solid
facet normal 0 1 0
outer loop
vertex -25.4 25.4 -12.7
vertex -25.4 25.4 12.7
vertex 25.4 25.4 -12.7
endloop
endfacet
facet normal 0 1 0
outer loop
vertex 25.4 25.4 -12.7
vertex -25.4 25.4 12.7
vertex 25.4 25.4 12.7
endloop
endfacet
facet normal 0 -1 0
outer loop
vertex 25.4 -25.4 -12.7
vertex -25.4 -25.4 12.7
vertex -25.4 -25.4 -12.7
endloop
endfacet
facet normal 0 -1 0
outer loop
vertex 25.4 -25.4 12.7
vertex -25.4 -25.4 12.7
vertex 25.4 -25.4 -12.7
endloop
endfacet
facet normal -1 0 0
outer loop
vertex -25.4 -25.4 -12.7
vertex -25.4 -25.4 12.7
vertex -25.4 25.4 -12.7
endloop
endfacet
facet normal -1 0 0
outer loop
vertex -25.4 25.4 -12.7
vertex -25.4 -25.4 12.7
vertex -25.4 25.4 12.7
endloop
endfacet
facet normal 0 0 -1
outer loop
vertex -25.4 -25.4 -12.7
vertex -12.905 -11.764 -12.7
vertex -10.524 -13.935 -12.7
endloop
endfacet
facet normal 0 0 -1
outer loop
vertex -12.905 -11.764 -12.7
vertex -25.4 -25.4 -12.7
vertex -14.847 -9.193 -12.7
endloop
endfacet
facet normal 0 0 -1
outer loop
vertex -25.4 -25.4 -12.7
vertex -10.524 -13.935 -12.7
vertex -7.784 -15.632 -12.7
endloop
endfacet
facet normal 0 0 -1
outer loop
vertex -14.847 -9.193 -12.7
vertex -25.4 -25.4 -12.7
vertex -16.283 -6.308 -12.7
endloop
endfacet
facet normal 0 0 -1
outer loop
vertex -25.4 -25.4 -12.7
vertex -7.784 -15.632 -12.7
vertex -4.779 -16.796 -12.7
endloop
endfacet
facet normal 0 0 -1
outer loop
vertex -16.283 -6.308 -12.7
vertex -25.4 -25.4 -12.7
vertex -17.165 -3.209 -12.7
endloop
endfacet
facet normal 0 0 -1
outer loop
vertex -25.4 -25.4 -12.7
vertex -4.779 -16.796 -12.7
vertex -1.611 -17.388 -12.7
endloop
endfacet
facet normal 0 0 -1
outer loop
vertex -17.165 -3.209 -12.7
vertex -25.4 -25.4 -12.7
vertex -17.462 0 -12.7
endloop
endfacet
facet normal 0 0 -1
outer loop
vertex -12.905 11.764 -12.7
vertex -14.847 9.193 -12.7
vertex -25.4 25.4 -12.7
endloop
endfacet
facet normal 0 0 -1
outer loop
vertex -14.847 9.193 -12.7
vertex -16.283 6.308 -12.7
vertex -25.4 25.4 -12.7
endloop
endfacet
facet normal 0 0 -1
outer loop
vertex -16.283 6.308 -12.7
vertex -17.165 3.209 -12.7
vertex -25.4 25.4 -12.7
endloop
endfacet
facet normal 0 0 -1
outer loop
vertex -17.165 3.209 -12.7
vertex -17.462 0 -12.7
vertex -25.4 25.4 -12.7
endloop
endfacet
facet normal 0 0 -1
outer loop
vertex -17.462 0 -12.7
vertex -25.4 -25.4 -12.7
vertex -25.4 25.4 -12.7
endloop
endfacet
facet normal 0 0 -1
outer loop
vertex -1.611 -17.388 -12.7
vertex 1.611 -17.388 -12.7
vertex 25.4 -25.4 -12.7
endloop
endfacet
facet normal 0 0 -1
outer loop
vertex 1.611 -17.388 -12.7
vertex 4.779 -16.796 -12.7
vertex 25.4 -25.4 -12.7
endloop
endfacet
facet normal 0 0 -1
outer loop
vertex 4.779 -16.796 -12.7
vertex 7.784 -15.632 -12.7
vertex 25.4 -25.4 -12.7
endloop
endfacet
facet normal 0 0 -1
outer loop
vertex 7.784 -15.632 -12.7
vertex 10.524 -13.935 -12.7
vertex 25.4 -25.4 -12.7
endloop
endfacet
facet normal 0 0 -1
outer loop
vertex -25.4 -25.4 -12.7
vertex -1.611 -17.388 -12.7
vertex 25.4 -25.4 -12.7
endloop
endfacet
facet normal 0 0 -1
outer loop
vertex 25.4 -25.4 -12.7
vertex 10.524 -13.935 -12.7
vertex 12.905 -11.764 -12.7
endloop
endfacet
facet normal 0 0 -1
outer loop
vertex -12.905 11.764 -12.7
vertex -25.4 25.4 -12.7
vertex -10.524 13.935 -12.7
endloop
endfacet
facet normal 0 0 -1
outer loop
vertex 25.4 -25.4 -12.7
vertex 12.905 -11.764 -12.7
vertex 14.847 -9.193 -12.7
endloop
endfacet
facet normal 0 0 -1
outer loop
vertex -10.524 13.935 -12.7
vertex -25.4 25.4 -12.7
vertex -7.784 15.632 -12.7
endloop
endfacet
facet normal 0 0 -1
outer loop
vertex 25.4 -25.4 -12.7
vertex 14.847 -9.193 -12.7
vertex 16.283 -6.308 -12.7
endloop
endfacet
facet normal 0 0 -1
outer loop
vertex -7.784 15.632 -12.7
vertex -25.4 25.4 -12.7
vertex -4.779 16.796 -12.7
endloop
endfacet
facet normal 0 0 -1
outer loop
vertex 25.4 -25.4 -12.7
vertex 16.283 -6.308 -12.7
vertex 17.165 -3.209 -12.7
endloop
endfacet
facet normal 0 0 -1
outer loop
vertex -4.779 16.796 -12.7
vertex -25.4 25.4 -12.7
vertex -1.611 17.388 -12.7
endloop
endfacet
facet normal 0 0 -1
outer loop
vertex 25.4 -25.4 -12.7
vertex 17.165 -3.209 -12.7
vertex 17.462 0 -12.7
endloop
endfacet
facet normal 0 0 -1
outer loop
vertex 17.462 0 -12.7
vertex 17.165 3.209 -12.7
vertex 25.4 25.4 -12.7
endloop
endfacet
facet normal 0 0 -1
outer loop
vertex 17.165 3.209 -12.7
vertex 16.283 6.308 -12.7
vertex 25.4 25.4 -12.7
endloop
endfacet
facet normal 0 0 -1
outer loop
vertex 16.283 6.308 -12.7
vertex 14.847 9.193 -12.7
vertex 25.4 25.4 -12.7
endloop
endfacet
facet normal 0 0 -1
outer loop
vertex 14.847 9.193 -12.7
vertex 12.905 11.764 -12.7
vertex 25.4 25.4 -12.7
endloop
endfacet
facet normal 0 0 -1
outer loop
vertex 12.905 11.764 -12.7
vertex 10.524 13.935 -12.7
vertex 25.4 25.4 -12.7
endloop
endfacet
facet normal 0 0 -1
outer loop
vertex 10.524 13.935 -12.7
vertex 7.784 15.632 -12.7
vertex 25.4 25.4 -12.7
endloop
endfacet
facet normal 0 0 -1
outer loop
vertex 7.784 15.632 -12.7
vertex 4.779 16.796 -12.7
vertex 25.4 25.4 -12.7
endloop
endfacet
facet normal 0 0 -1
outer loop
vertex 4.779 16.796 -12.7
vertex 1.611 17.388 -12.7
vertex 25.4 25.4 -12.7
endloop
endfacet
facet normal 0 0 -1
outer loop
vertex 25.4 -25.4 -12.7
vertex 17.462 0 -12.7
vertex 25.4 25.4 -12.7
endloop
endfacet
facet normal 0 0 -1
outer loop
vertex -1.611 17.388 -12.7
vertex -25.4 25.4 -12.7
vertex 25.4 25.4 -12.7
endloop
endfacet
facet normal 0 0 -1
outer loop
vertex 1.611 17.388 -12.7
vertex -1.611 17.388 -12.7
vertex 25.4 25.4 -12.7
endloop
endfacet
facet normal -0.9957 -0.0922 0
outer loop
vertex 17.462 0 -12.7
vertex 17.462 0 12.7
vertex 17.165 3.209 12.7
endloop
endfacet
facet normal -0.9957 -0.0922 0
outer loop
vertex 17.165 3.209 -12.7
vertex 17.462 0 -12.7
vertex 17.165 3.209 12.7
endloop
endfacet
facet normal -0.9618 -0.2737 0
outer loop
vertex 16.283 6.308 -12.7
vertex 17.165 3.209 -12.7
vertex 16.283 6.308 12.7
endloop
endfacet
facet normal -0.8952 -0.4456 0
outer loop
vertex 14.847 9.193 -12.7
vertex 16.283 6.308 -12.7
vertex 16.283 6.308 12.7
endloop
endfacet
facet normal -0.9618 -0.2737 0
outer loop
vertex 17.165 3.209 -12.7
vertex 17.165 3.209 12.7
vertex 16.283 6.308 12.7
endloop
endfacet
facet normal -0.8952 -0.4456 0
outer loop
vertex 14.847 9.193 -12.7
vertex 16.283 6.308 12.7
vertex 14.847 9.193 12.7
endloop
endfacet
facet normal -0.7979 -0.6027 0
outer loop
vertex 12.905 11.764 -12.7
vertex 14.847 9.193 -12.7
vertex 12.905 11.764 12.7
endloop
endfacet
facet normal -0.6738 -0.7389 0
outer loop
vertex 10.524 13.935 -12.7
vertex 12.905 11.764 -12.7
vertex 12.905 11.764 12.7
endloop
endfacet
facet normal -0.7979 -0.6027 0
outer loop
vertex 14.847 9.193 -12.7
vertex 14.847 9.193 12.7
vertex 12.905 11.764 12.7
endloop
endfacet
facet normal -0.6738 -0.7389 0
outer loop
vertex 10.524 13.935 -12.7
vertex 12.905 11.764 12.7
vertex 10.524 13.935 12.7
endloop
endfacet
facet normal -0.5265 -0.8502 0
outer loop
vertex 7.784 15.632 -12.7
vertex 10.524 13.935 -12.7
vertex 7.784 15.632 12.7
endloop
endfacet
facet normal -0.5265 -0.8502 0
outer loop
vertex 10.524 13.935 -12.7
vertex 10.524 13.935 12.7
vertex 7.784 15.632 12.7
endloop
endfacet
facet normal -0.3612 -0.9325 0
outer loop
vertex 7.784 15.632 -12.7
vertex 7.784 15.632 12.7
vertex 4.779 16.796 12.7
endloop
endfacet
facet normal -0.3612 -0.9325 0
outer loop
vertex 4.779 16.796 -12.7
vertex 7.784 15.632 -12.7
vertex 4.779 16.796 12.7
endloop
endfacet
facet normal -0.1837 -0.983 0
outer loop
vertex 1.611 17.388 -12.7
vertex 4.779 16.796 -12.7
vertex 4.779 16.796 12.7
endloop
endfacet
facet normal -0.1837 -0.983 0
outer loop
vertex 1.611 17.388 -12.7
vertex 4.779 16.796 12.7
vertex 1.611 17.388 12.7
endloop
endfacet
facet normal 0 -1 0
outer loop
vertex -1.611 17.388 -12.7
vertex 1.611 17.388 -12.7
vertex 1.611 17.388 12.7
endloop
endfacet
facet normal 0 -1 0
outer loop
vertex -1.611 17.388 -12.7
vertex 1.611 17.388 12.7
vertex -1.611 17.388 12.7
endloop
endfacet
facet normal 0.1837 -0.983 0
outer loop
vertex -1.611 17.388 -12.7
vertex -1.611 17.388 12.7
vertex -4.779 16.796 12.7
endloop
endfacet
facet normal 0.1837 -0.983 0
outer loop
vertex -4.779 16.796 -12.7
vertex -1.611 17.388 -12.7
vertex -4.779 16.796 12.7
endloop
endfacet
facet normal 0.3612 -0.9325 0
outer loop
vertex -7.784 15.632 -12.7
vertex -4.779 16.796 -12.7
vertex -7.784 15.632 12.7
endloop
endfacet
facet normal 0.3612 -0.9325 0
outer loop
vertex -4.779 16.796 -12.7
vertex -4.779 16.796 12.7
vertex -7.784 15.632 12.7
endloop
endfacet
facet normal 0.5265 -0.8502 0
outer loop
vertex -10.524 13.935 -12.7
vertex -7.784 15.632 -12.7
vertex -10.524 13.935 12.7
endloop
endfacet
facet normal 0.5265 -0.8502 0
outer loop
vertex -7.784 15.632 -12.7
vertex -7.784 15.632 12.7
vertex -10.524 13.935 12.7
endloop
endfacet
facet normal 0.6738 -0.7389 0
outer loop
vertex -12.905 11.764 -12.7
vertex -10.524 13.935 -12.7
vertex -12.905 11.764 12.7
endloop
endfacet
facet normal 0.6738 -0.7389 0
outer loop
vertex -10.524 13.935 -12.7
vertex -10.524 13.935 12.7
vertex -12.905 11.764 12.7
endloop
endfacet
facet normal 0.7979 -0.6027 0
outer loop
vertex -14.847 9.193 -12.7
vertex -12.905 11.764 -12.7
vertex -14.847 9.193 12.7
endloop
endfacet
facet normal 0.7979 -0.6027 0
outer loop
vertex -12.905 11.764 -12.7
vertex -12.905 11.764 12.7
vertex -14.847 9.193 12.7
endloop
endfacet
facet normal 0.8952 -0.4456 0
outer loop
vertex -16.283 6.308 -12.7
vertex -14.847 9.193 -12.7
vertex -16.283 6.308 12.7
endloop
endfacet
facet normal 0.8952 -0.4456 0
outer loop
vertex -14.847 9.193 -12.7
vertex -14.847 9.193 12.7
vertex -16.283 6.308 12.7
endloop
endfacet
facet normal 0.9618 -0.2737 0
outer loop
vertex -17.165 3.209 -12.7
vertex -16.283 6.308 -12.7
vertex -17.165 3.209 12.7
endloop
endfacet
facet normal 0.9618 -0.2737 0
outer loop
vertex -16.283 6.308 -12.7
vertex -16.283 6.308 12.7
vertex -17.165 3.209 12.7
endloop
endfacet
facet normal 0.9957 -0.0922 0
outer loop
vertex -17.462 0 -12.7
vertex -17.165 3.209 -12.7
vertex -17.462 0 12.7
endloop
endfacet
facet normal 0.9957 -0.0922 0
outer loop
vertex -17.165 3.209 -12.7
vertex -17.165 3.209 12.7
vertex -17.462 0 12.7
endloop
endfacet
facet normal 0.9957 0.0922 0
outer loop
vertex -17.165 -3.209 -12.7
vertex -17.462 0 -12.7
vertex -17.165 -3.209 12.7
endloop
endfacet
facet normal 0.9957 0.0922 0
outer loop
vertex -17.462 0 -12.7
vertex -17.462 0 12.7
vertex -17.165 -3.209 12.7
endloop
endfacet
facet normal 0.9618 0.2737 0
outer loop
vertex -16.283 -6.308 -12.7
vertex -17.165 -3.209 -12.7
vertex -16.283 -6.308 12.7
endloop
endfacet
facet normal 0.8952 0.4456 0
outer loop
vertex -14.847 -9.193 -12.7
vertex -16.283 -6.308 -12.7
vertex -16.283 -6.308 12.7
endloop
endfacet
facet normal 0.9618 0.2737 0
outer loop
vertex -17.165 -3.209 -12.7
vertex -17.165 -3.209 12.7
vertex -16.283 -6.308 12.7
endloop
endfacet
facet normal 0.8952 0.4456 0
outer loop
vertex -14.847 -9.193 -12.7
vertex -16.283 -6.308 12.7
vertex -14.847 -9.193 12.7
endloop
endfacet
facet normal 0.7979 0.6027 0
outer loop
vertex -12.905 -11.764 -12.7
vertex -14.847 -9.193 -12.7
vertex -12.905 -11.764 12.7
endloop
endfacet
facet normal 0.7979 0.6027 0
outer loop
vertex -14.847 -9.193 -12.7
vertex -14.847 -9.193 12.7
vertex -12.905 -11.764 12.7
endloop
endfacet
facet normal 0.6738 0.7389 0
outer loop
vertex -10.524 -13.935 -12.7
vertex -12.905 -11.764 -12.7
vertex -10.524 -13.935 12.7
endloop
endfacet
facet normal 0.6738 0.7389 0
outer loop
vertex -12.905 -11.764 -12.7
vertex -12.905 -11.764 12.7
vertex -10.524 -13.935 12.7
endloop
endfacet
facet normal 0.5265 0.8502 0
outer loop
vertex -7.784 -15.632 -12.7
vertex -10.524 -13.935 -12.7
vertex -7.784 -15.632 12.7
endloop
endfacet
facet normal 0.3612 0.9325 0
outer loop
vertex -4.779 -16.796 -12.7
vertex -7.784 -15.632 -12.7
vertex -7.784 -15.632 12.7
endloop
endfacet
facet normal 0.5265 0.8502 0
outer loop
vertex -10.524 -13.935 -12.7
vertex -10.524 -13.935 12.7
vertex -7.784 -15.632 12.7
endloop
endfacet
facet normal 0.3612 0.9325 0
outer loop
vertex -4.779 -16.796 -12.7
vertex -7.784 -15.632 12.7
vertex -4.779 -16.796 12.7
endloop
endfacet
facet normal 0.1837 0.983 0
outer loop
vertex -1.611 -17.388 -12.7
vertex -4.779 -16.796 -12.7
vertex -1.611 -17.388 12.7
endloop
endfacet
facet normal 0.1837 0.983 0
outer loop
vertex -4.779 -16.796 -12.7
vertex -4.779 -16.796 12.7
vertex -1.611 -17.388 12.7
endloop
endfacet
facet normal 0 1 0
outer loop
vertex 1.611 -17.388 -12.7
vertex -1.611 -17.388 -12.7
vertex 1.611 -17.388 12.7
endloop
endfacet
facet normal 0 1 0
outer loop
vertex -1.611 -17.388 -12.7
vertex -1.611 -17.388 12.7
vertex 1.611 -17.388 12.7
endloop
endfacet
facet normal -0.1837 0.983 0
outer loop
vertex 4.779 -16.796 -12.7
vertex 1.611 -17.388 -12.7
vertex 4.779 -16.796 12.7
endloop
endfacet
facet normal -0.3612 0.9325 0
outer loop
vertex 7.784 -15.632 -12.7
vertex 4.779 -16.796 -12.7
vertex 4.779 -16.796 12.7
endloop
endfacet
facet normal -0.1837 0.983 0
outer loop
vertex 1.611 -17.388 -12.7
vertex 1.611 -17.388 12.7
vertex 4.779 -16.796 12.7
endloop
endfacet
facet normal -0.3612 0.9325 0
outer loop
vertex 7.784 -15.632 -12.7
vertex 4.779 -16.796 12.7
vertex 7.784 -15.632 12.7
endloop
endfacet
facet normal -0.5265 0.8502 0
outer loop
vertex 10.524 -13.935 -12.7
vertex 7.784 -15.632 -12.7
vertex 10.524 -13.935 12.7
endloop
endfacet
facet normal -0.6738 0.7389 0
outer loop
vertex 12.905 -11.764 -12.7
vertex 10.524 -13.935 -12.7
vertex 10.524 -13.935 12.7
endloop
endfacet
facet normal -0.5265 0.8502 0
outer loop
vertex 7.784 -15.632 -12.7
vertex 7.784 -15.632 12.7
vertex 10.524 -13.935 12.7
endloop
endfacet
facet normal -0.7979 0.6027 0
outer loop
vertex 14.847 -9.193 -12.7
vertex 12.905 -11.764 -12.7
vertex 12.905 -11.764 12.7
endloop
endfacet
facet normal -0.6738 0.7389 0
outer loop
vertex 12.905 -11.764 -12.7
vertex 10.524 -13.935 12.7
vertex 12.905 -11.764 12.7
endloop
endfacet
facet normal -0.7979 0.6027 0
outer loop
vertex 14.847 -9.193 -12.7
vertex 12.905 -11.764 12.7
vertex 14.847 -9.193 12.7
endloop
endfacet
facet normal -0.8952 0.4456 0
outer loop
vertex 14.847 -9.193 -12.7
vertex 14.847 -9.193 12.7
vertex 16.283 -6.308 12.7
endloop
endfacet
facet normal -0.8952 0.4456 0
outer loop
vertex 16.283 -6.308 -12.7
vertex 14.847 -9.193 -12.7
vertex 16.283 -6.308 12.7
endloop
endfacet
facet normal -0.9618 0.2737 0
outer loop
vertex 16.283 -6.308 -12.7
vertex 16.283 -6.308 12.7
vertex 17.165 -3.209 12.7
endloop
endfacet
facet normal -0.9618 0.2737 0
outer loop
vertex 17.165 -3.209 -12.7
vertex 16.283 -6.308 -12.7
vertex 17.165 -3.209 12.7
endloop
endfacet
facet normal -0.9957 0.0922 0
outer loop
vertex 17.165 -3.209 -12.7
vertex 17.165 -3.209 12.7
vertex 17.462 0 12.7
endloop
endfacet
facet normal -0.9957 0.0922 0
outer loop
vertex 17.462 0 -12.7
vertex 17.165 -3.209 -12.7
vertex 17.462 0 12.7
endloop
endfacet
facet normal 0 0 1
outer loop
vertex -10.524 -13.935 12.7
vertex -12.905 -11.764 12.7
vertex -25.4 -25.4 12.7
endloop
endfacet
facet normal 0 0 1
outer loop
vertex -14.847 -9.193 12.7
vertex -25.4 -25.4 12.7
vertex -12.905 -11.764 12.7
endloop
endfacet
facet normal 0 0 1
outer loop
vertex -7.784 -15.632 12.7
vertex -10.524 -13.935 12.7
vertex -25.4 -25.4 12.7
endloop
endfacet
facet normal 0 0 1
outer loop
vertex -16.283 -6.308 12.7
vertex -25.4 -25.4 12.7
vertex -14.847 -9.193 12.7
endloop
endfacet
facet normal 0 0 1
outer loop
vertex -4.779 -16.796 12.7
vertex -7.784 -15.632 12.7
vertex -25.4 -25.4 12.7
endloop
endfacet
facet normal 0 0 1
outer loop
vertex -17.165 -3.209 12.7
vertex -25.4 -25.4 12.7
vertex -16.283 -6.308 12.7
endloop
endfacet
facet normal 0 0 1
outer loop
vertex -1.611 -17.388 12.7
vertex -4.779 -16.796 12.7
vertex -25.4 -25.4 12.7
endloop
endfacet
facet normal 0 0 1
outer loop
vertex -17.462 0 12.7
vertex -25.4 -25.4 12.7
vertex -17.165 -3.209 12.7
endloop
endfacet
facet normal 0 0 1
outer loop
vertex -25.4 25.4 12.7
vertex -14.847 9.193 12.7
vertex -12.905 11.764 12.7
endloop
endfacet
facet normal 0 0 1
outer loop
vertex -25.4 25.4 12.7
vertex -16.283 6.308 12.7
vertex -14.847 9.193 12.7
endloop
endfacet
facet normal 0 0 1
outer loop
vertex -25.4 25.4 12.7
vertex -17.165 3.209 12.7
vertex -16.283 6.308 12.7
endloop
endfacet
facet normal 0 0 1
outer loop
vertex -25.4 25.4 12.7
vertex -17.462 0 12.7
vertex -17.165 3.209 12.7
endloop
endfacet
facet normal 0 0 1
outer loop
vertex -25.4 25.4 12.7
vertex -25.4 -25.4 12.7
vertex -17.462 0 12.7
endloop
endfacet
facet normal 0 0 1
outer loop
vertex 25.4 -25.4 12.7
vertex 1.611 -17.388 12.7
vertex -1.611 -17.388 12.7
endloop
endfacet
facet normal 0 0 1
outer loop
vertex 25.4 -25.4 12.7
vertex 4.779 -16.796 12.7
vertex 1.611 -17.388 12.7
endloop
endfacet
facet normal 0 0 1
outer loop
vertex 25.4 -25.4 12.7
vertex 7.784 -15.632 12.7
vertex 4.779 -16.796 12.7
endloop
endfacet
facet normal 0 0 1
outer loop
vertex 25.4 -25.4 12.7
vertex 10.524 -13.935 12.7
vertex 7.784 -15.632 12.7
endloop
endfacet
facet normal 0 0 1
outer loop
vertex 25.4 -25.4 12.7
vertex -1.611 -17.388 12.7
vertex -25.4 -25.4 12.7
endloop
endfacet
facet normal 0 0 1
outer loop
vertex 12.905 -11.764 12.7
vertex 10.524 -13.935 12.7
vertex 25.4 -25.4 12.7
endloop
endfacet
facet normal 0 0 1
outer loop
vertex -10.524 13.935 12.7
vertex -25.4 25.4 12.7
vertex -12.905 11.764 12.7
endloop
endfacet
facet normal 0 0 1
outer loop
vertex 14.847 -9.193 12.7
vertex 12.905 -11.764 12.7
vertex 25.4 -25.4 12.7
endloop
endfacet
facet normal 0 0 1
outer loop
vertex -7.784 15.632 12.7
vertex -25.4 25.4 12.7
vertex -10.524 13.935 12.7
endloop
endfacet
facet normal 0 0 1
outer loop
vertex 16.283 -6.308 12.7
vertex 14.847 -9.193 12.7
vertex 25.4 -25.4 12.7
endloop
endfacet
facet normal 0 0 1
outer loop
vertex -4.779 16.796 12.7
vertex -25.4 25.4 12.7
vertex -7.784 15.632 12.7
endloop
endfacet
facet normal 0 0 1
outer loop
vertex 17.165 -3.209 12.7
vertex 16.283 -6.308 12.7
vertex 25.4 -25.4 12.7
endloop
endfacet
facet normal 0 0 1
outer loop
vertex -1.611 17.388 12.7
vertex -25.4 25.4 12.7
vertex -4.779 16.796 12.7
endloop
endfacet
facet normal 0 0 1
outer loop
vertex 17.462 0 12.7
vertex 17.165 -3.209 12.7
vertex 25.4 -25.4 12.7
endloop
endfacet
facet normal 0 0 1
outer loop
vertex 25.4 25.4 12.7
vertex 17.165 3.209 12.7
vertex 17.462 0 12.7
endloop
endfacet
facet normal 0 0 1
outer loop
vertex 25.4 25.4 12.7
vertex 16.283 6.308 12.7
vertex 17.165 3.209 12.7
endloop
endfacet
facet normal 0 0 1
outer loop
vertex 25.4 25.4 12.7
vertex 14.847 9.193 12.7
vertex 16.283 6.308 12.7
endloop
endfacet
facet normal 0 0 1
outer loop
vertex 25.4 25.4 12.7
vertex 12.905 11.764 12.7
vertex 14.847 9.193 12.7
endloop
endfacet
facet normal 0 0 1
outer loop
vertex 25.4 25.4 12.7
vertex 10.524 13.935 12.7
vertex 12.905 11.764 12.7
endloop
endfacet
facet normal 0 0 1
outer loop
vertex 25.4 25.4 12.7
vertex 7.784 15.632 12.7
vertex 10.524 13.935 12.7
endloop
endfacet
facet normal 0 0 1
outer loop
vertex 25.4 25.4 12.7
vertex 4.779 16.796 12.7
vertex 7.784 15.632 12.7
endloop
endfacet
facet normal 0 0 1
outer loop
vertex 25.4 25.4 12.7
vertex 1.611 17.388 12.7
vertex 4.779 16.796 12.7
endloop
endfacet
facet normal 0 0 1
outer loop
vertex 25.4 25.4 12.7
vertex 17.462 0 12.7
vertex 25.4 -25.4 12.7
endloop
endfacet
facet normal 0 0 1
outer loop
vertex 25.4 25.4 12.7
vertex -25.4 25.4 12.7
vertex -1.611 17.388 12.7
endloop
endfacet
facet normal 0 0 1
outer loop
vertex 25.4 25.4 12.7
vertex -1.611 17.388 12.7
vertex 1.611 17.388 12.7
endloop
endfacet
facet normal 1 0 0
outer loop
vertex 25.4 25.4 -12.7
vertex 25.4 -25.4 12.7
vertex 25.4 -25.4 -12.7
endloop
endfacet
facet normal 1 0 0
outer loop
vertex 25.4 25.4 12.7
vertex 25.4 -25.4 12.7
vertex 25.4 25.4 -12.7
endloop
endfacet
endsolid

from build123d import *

# Parameters (mm, degrees)
F0_W     = 50.8
F0_H     = 50.8
F1_DEPTH = 12.7
F2_W     = 50.8
F2_H     = 50.8
F2_R     = 17.4625
F3_DEPTH = 25.4


with BuildPart() as f1:
    # F0 (on Top) → F1 (new body, symmetric)
    with BuildSketch(Plane.XY):
        Rectangle(F0_W, F0_H)
    extrude(amount=F1_DEPTH, both=True)

    # F2 (on face) → F3 (intersect, through all)
    with BuildSketch(Plane.XY.offset(12.7)):
        Rectangle(F2_W, F2_H)
        Circle(F2_R, mode=Mode.SUBTRACT)
    extrude(amount=-F3_DEPTH, mode=Mode.INTERSECT)


solid = f1.part
